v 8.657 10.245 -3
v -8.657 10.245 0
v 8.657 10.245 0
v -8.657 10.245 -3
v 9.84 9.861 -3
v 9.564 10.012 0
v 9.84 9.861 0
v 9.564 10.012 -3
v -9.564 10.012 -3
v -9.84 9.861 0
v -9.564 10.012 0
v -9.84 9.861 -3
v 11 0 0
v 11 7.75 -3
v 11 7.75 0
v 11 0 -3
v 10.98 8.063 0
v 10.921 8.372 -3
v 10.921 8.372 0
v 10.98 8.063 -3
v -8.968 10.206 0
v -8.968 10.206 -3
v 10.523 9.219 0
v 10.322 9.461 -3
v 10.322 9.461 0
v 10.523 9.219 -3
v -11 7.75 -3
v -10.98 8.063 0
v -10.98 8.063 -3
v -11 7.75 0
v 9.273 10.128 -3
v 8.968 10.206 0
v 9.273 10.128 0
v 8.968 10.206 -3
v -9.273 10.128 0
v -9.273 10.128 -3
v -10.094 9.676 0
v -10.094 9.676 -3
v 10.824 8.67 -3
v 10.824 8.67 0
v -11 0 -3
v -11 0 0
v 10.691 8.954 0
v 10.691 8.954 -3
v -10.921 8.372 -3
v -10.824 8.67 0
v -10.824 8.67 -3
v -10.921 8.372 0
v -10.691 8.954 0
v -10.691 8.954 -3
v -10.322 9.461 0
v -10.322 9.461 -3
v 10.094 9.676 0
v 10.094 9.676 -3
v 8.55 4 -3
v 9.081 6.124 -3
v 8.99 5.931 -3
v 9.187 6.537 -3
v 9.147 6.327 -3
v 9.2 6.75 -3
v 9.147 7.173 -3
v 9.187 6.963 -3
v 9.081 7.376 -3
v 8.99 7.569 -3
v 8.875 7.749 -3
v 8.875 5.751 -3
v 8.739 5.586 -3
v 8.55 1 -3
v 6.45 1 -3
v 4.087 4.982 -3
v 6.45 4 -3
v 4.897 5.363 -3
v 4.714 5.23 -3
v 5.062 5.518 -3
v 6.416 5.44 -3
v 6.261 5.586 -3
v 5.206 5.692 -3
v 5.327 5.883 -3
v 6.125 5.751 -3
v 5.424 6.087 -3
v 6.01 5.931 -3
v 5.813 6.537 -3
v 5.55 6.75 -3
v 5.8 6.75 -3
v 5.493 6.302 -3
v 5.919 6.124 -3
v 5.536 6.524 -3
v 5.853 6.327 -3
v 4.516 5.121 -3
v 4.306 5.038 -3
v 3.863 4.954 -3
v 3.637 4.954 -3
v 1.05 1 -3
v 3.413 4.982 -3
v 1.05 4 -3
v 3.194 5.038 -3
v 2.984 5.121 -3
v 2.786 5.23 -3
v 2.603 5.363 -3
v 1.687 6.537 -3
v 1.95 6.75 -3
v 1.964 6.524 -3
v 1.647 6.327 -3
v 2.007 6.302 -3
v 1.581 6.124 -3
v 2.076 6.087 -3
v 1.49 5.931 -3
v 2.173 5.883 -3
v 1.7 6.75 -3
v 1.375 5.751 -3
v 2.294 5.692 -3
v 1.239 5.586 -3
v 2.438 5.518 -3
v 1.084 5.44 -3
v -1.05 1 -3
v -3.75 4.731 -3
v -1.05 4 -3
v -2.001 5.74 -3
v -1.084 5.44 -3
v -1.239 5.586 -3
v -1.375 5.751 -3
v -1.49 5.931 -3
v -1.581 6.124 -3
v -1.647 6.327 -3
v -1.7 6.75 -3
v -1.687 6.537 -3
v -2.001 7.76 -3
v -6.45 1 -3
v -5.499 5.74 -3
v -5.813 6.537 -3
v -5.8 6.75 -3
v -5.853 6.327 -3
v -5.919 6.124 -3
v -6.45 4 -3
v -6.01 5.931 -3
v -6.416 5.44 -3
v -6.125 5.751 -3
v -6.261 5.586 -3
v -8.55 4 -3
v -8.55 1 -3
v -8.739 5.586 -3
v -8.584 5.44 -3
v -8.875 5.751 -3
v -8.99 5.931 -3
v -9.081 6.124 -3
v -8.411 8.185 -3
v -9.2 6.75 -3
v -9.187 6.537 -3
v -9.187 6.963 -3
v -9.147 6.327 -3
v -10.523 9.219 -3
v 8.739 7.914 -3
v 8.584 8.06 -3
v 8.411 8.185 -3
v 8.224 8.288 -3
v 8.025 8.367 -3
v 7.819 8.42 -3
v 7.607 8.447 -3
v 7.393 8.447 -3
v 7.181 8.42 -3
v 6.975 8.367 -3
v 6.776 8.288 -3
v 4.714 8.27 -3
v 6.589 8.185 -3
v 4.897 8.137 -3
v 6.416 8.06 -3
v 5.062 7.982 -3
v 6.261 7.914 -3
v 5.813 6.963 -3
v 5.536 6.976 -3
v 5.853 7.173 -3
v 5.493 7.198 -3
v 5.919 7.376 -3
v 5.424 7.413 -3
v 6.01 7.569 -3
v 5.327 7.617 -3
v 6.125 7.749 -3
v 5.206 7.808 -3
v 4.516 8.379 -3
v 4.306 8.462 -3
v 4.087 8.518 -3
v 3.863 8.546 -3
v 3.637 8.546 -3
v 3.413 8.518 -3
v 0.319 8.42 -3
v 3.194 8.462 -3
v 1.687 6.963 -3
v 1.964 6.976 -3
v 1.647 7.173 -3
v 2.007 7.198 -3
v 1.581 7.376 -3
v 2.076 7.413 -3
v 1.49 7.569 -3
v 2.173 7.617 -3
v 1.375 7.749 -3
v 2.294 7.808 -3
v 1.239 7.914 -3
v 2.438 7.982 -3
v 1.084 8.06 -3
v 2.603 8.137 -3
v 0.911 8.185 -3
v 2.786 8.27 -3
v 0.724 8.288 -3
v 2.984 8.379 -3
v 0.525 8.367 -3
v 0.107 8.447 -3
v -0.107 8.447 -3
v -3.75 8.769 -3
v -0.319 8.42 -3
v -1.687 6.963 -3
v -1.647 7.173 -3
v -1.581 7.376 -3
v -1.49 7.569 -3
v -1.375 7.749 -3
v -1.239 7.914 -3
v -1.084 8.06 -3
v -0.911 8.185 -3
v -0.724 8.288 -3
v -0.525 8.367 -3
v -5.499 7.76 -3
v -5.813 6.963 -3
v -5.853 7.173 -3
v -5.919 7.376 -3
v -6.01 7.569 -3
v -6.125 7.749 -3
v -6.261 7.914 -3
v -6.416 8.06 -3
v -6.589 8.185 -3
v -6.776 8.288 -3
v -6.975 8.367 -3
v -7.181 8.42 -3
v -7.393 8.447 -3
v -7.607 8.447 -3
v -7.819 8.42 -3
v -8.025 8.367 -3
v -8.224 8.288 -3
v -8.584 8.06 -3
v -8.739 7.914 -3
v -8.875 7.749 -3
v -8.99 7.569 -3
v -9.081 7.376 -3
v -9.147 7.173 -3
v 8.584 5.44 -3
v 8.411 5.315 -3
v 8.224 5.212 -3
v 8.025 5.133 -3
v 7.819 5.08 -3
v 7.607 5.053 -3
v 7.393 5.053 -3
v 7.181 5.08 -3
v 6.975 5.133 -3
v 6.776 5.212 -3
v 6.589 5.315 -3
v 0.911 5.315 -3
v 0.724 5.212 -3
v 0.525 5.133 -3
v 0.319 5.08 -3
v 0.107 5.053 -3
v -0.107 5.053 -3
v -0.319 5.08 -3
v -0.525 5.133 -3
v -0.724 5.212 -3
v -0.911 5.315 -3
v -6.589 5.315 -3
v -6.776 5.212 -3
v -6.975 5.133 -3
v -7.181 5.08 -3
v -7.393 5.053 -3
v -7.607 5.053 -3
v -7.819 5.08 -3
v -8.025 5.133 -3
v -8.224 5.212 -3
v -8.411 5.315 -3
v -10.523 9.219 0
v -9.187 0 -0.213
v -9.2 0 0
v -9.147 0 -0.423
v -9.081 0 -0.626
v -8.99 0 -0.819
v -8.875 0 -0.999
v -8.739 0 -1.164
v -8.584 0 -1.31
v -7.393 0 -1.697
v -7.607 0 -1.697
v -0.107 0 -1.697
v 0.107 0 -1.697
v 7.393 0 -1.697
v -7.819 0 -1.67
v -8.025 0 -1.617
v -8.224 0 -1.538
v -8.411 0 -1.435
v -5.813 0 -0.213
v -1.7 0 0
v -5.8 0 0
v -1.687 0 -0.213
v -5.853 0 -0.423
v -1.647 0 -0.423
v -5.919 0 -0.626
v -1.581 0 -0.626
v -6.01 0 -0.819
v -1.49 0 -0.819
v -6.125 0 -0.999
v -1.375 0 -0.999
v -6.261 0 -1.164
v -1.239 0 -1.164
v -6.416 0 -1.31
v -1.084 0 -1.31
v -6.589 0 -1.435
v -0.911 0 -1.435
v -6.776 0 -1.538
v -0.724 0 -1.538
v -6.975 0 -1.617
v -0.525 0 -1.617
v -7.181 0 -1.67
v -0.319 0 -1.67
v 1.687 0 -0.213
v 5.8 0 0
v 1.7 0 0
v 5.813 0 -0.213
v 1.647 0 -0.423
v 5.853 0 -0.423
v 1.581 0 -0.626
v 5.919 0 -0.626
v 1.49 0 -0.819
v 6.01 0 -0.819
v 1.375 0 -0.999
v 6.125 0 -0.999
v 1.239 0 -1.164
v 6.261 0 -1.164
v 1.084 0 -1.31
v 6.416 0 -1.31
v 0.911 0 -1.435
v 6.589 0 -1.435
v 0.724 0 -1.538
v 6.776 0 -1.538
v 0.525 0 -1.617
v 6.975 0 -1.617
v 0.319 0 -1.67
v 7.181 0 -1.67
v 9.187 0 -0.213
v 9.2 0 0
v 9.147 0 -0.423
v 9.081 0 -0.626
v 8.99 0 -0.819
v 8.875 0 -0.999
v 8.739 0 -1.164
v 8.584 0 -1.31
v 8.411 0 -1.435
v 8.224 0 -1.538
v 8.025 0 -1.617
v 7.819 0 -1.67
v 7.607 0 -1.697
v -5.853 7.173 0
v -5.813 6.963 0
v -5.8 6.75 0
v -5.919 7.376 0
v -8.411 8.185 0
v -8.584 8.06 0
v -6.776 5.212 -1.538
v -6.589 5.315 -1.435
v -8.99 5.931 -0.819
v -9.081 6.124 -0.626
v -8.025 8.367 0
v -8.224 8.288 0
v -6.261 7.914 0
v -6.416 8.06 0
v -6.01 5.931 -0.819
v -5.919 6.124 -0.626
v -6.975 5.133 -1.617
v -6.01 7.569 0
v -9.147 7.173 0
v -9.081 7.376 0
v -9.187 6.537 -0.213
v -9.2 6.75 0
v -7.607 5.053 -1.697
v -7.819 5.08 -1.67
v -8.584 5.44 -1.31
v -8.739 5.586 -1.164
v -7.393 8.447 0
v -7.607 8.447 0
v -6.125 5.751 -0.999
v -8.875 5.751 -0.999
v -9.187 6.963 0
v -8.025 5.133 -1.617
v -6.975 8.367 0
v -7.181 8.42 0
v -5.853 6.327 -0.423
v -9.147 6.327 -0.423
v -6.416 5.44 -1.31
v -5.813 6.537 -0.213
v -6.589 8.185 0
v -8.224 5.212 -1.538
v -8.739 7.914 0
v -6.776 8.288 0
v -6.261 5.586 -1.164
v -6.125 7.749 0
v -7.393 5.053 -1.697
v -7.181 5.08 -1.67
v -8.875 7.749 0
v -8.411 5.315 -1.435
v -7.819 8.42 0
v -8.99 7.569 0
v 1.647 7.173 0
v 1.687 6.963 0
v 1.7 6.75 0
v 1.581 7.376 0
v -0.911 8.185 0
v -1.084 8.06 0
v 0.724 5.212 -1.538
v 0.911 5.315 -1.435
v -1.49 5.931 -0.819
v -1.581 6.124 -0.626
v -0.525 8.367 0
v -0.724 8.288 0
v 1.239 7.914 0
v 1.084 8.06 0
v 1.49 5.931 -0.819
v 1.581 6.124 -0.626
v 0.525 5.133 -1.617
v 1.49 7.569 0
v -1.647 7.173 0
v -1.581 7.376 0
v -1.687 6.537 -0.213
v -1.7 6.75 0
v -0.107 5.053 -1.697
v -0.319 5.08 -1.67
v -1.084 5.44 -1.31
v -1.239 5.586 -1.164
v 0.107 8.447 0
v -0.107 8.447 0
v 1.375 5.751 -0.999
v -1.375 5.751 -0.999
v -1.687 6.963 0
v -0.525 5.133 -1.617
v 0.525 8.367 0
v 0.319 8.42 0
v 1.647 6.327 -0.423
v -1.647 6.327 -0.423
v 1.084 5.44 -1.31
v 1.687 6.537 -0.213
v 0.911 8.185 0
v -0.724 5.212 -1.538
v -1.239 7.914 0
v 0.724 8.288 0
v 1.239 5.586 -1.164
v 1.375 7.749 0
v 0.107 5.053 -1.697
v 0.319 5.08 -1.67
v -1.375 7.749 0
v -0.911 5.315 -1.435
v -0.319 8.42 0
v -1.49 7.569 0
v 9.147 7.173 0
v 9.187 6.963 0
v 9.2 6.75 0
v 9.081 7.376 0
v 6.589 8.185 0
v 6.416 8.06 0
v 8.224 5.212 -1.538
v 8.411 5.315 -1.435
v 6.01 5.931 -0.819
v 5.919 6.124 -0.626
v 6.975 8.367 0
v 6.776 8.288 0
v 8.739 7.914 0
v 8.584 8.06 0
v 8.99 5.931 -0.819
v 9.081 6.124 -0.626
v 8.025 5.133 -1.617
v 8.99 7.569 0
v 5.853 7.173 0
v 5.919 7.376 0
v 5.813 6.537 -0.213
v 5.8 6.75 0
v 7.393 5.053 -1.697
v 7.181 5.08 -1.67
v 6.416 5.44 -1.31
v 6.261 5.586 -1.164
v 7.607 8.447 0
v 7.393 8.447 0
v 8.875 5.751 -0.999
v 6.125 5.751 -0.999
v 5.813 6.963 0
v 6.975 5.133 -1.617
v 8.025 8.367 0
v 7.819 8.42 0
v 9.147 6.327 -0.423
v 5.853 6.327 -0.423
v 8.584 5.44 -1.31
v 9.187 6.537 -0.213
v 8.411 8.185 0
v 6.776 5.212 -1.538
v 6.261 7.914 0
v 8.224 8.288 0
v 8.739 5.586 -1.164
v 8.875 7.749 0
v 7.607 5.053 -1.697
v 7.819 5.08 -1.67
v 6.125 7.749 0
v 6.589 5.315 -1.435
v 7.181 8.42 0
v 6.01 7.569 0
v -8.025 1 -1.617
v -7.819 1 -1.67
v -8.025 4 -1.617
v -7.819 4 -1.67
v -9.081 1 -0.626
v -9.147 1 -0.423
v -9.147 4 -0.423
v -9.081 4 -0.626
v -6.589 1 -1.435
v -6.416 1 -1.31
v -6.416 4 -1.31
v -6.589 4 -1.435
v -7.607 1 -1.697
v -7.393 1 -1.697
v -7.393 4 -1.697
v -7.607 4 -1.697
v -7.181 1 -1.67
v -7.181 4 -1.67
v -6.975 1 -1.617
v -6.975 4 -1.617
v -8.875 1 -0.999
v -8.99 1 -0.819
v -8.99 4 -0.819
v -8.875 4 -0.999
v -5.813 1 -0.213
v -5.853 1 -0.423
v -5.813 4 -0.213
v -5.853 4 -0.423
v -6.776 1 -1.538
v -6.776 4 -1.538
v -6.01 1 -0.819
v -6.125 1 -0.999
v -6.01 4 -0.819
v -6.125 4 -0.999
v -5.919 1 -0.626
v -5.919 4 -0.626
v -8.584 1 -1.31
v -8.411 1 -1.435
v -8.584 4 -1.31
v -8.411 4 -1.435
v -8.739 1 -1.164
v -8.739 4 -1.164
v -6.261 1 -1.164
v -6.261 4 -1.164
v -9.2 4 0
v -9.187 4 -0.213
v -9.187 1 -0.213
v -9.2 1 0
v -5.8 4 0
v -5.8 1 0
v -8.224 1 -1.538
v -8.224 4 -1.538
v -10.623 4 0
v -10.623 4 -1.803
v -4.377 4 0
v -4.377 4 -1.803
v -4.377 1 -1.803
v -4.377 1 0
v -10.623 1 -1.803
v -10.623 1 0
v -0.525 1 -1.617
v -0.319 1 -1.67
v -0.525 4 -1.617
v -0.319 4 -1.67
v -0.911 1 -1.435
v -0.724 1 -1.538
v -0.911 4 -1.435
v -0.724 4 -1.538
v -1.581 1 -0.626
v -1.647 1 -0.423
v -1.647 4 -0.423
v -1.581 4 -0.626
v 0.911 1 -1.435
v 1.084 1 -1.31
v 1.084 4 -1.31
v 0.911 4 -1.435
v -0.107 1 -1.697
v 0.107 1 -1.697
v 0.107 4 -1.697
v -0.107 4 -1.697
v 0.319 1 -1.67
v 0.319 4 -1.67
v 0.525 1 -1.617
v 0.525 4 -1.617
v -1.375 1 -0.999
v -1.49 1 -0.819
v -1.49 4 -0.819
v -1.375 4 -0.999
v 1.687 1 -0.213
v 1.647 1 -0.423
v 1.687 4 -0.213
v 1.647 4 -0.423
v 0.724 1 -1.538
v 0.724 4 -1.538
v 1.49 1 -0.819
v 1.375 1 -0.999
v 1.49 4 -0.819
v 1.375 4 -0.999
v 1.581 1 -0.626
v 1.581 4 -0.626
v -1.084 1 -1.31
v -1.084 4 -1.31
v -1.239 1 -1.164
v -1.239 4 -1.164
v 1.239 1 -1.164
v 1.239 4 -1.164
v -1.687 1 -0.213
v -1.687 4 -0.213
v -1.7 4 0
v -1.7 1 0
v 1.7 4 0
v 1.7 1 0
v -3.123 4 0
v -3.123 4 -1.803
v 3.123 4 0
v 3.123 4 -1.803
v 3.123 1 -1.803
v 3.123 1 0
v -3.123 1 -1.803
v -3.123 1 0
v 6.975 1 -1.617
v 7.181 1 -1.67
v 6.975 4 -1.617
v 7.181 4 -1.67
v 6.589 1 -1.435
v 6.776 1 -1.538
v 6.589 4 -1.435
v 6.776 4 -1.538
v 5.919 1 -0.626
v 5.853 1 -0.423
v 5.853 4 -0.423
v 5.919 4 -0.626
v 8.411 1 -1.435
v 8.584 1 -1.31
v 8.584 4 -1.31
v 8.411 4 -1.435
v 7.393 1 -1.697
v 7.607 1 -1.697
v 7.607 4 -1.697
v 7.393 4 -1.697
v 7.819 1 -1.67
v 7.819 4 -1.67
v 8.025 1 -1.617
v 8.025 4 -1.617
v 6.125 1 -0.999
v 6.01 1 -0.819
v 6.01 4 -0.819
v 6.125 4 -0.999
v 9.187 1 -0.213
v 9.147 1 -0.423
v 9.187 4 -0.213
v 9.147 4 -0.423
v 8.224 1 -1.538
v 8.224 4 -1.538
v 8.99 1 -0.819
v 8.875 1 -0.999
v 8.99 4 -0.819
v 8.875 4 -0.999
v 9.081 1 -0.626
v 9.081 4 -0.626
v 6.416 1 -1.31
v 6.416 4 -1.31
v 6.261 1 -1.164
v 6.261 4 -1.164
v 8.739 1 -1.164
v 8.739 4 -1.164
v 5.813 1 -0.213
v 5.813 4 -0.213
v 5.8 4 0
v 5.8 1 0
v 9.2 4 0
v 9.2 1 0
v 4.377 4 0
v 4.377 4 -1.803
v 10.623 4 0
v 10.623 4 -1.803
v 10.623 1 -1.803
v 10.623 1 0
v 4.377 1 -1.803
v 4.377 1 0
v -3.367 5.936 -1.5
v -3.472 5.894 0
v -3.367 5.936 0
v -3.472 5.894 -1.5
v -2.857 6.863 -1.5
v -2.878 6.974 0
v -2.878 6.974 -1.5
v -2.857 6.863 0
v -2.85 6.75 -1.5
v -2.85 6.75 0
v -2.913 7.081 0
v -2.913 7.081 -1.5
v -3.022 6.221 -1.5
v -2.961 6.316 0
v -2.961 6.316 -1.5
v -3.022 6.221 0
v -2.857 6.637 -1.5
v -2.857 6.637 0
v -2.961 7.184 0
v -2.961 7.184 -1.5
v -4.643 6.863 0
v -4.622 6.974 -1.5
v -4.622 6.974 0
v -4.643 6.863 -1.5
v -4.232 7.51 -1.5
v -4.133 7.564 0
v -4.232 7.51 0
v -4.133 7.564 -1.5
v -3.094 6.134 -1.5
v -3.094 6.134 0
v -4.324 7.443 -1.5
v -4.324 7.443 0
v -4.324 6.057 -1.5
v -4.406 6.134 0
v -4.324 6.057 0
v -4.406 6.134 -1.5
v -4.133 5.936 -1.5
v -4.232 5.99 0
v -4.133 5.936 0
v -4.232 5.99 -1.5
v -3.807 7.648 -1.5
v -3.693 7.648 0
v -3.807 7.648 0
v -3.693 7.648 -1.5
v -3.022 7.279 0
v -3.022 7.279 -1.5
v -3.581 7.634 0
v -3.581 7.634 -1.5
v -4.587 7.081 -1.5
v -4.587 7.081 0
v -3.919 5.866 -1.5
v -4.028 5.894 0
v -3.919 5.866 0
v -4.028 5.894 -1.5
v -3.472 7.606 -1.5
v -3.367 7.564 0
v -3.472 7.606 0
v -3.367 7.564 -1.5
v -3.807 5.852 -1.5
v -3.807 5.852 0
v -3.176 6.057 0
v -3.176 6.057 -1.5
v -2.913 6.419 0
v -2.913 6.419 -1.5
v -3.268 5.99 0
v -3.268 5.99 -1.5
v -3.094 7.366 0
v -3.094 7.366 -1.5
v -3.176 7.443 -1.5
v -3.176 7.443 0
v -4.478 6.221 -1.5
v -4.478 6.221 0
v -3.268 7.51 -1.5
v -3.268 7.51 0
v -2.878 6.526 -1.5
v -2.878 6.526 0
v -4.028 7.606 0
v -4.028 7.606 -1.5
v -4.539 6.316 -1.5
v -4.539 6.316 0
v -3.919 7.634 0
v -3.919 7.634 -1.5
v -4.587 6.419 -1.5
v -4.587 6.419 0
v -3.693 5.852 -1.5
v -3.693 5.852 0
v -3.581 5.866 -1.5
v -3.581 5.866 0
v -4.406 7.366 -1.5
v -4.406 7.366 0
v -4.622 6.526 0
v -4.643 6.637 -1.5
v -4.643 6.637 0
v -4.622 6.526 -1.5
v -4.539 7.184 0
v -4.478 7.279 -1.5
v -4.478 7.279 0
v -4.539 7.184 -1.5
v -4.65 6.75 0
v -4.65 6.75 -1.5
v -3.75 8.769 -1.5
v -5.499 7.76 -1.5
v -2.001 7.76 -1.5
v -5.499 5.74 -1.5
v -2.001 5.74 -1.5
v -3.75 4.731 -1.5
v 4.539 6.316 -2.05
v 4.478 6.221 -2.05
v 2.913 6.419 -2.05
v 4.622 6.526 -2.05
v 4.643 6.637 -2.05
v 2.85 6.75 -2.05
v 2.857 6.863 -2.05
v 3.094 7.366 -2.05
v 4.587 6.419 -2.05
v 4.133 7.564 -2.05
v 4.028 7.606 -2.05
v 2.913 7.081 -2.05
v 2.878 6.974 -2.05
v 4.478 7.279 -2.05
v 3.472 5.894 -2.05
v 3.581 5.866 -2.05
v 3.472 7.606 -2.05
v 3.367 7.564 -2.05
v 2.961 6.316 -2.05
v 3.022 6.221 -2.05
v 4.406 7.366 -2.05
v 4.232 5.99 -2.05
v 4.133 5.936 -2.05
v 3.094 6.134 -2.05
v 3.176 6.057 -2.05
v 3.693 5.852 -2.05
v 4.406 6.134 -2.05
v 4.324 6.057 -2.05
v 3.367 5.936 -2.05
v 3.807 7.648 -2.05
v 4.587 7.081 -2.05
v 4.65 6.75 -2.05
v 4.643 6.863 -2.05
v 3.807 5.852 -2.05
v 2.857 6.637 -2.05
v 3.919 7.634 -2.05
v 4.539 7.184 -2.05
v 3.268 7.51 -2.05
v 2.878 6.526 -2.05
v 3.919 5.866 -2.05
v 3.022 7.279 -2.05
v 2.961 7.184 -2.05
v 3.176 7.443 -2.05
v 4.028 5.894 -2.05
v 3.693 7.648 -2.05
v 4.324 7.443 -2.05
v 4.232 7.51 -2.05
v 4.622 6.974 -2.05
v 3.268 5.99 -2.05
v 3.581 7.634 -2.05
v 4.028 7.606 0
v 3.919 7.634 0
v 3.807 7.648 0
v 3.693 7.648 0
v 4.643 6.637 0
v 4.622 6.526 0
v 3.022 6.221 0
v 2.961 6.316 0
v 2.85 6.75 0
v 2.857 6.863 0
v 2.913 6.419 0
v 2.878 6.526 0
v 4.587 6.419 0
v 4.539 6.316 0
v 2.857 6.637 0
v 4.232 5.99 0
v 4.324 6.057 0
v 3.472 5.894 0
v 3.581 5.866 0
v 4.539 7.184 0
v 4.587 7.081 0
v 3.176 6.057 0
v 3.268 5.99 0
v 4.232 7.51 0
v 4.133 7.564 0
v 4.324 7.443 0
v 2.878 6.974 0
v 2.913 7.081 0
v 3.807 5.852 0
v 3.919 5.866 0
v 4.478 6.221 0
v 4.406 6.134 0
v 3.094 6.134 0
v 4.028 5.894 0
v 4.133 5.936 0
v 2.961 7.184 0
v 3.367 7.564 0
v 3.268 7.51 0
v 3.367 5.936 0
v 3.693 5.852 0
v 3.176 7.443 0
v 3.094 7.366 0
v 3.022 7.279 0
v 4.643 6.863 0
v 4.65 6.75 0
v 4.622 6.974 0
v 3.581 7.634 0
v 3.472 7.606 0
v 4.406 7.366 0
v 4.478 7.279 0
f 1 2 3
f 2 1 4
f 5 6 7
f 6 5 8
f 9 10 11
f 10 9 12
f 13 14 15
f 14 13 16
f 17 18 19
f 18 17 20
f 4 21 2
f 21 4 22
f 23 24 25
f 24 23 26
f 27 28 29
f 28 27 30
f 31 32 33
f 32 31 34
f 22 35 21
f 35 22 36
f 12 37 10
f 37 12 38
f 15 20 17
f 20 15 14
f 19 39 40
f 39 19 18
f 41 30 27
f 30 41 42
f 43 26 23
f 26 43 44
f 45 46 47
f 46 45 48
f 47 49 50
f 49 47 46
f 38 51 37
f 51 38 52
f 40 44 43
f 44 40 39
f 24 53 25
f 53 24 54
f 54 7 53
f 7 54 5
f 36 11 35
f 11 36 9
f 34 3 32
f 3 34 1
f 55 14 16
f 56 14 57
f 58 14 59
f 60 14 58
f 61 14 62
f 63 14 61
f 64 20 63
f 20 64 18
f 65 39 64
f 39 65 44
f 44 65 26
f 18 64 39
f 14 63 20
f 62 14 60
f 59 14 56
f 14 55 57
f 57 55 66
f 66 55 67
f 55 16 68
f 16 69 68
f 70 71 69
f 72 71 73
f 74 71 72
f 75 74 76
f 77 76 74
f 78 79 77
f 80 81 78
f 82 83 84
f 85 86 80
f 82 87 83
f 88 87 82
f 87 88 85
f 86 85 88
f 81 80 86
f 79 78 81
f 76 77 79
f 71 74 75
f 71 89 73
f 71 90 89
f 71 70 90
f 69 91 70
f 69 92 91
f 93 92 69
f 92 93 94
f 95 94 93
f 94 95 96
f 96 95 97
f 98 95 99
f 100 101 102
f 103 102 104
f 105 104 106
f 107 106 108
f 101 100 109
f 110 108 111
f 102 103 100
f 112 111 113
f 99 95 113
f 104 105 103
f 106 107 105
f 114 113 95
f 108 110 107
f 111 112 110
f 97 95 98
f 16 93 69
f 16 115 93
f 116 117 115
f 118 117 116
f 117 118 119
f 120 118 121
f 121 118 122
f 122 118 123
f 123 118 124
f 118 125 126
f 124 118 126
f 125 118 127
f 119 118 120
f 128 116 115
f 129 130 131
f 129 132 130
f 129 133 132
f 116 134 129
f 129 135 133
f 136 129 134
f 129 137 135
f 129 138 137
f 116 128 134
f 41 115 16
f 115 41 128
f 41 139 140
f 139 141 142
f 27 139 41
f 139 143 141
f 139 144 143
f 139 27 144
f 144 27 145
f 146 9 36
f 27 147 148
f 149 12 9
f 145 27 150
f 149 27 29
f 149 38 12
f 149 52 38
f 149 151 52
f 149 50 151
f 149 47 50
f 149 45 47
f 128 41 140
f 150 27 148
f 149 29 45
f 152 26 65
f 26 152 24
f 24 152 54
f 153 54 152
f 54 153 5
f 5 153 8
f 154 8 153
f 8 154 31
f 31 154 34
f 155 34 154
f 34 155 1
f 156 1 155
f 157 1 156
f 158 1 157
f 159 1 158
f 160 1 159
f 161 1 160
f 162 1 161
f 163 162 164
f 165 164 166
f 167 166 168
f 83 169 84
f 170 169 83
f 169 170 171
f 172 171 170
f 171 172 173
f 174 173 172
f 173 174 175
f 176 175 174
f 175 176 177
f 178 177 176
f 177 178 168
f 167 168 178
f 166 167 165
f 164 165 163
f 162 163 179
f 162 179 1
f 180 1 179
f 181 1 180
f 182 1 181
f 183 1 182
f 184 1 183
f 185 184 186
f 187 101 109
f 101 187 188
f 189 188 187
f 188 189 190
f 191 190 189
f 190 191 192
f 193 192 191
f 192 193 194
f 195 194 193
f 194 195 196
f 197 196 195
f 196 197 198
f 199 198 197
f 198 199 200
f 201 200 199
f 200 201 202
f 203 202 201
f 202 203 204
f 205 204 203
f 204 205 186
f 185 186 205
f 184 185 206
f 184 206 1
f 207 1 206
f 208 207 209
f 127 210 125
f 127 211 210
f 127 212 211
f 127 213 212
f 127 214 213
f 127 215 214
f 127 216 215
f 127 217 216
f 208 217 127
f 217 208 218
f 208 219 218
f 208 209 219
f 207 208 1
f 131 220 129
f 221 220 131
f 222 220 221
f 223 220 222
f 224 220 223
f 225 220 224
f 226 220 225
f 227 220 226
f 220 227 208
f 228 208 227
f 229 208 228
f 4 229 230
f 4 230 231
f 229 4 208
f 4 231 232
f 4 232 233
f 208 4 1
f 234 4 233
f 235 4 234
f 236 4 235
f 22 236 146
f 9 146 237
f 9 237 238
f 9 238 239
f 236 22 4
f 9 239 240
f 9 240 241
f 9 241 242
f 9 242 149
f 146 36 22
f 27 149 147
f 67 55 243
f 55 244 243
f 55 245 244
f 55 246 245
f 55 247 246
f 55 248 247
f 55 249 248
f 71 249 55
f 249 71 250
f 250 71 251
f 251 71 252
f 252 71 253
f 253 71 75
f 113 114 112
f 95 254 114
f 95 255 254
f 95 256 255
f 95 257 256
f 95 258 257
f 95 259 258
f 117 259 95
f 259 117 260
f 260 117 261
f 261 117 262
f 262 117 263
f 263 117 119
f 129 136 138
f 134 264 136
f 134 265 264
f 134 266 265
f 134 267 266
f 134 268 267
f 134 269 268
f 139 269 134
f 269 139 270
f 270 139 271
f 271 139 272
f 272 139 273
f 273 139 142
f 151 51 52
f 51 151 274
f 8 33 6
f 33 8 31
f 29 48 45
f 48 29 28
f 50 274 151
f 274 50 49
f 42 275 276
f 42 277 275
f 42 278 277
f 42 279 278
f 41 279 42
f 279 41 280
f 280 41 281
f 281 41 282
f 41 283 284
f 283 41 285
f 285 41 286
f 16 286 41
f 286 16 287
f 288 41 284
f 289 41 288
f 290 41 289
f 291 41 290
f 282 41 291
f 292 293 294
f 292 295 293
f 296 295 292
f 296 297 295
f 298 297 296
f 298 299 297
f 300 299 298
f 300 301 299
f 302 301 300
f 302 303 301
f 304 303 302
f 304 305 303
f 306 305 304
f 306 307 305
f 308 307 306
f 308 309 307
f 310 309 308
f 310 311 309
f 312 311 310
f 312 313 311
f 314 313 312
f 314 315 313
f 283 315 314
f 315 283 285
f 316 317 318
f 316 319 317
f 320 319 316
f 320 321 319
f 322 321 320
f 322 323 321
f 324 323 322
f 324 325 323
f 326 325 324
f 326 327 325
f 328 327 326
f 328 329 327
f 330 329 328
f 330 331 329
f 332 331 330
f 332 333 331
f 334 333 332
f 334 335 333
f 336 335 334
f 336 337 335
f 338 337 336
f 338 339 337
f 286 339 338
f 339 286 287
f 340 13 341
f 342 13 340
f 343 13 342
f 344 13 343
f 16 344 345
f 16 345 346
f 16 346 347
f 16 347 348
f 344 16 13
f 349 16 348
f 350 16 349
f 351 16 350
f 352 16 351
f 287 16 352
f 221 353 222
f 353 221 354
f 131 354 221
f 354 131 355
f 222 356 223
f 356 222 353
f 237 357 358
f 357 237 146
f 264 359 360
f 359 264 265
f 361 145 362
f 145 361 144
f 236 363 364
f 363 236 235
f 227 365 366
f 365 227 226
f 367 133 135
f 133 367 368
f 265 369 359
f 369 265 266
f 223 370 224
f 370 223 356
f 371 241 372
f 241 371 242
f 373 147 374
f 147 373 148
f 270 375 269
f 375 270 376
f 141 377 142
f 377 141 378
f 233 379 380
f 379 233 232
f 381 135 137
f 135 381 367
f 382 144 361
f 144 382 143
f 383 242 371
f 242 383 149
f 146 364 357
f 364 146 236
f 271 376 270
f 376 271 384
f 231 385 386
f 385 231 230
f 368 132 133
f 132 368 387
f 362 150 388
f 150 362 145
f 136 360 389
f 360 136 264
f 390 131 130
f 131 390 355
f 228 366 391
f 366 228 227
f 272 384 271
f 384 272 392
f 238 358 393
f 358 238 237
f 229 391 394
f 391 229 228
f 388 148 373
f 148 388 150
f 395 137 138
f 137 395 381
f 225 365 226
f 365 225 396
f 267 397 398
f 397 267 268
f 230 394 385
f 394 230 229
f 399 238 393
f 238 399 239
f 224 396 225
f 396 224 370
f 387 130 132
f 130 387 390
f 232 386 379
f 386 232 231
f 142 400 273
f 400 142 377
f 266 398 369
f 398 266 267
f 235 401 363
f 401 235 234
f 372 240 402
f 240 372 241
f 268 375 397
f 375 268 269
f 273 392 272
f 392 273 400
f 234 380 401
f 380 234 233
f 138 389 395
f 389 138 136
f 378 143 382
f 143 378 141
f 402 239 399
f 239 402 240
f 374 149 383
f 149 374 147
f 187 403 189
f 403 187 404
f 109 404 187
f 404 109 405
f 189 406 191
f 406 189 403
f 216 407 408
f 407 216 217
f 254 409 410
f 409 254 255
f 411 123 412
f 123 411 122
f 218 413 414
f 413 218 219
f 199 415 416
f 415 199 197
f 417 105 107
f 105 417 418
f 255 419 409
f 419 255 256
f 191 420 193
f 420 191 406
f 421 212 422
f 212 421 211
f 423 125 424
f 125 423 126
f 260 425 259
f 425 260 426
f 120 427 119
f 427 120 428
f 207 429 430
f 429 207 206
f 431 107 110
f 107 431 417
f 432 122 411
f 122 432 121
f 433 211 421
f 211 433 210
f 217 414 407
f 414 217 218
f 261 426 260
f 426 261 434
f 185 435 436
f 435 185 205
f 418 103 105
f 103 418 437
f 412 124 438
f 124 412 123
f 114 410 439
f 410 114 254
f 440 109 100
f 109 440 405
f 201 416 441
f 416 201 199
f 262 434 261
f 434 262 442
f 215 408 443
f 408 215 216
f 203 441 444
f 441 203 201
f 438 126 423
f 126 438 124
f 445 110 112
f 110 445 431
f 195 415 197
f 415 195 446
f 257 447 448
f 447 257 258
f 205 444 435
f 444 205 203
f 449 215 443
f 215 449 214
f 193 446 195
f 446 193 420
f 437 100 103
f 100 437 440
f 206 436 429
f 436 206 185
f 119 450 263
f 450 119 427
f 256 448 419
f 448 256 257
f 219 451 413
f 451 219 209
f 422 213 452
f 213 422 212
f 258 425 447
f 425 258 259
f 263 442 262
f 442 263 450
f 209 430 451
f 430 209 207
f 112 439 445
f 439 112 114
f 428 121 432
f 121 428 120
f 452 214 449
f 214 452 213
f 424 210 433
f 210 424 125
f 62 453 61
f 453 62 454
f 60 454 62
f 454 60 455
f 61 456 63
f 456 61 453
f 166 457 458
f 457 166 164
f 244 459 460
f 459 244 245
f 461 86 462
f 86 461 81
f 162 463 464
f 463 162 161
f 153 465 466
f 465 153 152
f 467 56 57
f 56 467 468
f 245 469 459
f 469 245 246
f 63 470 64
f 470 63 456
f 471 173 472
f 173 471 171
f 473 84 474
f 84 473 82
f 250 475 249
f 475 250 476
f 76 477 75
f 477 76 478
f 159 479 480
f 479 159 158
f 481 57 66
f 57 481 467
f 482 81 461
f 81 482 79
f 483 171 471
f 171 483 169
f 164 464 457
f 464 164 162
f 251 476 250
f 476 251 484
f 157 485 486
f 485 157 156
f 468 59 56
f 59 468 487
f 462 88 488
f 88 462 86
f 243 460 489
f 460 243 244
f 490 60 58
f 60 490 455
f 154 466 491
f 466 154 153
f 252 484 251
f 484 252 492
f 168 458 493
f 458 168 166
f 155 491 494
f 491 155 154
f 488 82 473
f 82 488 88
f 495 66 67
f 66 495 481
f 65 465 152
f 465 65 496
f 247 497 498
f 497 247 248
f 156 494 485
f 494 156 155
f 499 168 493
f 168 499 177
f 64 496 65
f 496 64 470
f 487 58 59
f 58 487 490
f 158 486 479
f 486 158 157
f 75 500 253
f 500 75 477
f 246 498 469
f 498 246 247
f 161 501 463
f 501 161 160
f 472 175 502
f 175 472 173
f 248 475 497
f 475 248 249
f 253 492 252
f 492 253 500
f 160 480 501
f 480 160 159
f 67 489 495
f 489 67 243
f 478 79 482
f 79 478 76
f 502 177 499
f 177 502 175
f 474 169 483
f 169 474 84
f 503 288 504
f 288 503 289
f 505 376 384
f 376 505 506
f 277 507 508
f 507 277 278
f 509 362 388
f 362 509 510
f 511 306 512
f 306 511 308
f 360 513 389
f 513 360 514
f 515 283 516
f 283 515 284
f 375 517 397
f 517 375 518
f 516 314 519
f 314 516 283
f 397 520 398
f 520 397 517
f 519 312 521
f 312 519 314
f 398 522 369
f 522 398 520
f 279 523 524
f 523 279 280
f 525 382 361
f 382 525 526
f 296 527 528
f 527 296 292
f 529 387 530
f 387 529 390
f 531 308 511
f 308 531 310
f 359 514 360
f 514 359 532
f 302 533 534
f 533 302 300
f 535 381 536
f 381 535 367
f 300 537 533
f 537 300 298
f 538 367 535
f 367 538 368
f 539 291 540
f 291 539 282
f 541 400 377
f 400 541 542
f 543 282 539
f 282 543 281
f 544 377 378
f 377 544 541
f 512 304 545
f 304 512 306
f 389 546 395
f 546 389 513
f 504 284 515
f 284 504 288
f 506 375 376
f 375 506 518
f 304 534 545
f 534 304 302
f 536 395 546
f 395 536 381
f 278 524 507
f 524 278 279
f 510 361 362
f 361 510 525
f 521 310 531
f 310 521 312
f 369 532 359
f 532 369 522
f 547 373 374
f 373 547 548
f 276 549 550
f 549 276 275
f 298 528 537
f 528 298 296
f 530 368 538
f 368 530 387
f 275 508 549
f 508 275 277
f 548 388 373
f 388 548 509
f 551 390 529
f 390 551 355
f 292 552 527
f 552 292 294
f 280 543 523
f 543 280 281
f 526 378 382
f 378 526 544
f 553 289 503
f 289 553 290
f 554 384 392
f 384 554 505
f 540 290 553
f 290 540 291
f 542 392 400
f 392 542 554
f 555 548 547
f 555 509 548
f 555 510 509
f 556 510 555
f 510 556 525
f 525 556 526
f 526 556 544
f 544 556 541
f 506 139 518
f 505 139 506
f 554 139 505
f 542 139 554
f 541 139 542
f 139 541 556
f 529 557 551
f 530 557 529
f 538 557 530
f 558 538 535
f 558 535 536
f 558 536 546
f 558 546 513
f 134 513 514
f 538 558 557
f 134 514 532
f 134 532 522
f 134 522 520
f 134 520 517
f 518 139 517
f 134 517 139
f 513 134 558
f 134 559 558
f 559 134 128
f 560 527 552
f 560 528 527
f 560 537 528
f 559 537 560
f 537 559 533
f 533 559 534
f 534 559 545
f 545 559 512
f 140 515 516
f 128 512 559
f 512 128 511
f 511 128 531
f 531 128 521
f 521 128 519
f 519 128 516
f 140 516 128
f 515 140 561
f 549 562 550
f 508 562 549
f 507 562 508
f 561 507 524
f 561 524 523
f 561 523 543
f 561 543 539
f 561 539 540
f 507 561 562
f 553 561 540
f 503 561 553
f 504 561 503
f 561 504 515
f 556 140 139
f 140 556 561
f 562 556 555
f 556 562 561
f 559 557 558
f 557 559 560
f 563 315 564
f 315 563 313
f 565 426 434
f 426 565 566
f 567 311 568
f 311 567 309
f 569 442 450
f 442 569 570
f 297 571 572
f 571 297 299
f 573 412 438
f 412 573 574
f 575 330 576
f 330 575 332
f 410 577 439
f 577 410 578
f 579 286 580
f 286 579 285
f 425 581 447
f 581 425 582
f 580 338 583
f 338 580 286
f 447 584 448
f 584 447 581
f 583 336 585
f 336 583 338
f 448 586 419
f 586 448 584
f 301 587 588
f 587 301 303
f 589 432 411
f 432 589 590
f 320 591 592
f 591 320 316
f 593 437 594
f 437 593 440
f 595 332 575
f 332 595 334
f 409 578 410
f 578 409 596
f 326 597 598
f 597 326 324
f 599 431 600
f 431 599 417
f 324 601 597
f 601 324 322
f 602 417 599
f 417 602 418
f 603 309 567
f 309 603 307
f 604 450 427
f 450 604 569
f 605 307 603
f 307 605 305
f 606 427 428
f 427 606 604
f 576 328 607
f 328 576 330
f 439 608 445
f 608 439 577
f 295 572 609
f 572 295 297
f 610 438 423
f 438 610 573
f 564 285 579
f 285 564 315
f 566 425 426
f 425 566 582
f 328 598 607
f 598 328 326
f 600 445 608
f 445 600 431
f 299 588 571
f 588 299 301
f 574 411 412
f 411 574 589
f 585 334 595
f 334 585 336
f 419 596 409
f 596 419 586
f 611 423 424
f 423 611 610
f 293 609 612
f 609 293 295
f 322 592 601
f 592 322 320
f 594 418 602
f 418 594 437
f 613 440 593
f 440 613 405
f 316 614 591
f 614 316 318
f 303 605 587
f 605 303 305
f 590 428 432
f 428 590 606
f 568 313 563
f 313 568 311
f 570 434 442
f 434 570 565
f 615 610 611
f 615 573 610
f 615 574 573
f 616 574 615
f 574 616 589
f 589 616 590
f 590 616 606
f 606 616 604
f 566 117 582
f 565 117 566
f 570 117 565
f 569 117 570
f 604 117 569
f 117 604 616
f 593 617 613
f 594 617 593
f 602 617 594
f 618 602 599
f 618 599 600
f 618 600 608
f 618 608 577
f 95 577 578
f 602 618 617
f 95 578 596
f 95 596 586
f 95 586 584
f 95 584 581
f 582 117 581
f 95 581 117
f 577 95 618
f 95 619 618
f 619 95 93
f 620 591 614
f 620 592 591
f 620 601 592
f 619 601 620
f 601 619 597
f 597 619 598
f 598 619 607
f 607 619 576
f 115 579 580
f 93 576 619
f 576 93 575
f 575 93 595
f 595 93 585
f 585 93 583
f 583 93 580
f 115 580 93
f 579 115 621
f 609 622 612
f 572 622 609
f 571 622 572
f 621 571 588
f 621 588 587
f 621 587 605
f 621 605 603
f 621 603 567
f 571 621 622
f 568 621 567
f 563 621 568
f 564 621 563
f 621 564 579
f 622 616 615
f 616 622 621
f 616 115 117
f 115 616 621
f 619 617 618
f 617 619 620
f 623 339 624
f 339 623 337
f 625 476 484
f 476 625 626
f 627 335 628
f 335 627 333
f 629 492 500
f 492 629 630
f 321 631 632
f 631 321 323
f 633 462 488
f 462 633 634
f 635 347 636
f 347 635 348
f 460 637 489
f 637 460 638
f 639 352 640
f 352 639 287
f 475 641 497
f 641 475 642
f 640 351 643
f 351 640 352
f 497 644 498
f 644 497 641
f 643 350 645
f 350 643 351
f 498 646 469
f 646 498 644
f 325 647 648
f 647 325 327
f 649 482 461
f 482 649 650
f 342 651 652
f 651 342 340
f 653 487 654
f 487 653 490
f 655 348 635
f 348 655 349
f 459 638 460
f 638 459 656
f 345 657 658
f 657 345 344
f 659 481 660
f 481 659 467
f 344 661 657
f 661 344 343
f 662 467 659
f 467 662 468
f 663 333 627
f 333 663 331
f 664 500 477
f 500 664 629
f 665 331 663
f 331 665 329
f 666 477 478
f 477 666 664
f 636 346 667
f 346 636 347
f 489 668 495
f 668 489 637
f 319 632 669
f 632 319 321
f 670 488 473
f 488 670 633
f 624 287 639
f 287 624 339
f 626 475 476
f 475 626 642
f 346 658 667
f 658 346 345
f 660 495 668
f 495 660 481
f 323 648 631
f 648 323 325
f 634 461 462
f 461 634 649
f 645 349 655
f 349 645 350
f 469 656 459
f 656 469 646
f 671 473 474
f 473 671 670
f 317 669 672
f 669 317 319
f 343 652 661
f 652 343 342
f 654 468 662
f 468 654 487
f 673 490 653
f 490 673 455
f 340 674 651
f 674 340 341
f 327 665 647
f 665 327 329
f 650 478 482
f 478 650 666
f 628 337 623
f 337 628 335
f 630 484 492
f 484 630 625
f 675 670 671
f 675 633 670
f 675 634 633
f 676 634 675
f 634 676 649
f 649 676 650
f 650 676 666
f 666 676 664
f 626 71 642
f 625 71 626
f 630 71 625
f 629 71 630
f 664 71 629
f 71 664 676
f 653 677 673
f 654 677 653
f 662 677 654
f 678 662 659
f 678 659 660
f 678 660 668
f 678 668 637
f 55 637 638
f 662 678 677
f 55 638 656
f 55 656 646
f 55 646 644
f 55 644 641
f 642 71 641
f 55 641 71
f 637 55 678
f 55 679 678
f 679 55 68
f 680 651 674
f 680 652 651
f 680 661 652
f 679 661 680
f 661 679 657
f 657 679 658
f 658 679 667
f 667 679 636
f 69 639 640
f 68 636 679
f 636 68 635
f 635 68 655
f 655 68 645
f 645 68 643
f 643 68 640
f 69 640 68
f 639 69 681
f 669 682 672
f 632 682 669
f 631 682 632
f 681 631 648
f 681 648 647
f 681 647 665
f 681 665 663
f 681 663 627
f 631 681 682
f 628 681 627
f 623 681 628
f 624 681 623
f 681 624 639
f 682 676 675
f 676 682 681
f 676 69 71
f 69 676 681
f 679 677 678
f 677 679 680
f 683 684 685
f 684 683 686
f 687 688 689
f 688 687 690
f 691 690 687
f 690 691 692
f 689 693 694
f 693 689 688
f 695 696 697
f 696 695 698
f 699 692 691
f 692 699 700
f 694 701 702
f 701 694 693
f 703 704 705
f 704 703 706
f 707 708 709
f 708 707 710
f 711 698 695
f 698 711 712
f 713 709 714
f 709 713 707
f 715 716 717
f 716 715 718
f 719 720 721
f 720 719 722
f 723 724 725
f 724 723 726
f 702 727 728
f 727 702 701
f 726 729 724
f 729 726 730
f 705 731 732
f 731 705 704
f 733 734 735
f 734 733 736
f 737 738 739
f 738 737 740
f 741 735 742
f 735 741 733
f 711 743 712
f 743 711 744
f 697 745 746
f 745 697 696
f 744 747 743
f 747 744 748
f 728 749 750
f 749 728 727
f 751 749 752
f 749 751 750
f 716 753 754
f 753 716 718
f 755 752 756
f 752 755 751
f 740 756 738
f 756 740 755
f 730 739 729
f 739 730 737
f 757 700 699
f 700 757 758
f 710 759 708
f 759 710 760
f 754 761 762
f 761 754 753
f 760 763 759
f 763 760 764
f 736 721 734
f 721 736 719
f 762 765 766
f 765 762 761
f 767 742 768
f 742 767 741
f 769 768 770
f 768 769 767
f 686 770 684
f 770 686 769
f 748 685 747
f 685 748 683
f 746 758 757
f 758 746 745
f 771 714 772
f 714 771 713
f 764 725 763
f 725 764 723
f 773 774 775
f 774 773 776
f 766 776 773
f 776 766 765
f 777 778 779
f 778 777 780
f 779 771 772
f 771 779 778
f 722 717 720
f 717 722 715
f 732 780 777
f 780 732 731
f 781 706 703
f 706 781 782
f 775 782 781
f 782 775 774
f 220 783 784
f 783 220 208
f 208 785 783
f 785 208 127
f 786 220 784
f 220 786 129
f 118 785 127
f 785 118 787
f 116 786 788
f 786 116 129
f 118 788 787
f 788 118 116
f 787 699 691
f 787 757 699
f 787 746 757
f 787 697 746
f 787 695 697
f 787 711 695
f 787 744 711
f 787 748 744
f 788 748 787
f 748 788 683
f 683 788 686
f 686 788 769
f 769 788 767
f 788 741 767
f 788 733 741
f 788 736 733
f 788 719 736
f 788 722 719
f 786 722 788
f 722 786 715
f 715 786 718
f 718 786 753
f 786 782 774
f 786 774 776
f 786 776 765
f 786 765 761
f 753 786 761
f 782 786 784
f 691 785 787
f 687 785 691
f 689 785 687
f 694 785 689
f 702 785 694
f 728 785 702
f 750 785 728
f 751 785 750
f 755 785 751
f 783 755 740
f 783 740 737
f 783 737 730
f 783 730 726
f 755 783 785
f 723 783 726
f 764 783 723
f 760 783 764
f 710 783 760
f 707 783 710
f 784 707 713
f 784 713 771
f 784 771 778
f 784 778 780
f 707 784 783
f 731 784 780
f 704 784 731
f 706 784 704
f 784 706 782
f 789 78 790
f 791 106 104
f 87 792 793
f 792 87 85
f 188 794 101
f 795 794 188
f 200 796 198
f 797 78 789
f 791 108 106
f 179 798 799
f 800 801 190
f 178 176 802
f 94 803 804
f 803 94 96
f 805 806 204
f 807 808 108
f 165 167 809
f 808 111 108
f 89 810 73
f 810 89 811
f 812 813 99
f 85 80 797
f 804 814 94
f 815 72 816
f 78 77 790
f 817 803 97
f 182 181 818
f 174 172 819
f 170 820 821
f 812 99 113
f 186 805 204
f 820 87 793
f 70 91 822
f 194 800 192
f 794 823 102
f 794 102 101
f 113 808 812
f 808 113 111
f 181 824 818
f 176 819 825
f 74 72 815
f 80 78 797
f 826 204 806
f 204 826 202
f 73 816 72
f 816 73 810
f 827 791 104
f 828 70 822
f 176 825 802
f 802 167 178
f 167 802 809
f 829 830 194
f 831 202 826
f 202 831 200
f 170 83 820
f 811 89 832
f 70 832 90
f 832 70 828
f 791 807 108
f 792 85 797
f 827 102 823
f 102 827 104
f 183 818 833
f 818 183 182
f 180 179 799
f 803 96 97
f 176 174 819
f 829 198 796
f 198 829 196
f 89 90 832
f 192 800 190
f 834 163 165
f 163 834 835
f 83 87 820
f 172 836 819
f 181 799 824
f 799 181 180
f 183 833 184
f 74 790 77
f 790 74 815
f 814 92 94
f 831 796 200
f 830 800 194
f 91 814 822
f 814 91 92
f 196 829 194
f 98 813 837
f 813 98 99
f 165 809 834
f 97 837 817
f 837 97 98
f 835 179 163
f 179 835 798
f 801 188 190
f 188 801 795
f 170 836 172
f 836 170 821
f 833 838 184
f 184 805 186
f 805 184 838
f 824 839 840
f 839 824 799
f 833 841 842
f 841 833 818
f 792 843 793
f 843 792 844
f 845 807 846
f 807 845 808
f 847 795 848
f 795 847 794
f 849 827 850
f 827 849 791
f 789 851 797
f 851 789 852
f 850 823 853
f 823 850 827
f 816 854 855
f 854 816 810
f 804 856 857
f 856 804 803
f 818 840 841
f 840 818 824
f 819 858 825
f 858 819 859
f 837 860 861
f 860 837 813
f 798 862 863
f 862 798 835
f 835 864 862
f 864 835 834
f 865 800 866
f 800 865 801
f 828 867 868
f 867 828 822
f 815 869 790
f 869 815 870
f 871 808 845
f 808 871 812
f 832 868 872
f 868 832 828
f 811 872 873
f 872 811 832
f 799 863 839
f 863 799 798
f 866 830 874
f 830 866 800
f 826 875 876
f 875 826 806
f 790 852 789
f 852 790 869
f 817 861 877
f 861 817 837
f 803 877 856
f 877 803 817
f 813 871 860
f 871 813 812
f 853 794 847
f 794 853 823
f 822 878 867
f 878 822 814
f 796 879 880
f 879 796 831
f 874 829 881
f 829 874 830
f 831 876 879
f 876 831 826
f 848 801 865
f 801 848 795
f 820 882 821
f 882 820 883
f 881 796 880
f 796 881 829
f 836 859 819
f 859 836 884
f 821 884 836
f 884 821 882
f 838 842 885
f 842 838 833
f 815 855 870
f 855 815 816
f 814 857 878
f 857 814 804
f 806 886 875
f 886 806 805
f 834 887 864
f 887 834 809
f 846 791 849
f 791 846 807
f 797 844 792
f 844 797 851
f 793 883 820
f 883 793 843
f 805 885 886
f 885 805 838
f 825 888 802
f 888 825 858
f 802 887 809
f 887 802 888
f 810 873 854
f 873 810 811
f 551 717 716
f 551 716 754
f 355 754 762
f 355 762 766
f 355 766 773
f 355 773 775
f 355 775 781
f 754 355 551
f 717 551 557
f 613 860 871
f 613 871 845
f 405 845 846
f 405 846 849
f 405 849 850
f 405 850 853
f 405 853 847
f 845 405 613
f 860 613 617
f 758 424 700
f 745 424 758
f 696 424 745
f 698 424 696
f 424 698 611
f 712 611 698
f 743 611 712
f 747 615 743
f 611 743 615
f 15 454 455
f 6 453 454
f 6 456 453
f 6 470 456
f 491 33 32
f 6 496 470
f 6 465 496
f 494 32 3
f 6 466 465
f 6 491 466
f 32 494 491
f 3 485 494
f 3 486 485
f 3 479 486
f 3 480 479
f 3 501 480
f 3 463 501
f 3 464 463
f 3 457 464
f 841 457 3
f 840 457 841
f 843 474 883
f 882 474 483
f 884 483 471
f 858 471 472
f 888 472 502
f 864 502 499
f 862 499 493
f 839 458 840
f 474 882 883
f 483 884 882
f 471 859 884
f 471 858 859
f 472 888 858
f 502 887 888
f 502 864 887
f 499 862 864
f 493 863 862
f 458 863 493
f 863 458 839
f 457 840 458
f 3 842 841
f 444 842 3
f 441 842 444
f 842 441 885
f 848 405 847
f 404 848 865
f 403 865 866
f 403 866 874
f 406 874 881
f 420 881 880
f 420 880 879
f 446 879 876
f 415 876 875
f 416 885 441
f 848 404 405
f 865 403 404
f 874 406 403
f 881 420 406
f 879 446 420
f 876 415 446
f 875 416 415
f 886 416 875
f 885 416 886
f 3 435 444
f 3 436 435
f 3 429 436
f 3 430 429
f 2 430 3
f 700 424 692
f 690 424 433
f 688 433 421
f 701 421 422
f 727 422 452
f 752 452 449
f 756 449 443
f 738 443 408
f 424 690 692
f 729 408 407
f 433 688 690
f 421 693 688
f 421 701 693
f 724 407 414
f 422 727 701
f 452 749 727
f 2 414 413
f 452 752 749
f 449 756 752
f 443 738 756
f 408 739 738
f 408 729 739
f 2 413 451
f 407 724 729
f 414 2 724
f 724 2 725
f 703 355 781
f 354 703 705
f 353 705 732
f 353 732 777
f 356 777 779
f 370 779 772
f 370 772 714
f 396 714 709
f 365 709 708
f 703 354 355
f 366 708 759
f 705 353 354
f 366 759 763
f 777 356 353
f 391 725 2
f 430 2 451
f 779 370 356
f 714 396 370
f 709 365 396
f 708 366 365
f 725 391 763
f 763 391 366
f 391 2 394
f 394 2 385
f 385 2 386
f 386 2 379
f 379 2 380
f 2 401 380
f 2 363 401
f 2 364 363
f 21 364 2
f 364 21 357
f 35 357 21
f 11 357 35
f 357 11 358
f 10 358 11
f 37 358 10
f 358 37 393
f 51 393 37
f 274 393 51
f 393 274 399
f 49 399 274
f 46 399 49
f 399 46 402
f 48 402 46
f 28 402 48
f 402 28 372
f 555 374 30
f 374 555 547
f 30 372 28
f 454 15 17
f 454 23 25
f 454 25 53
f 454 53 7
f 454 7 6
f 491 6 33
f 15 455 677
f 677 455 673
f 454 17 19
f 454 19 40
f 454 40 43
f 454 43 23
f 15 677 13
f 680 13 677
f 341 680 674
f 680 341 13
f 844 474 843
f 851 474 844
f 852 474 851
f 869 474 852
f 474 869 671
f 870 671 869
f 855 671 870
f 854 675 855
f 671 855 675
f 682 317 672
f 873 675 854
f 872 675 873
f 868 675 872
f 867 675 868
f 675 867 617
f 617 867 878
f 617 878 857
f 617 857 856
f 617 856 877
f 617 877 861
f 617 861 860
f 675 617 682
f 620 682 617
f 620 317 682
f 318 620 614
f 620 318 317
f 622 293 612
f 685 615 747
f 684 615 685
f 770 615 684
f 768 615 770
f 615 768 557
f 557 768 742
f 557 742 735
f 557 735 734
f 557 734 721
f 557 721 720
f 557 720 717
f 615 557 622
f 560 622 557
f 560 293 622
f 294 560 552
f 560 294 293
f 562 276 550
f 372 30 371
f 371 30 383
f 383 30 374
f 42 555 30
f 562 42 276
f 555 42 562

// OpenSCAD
$fn = 50;


difference() {
	union() {
		translate(v = [0, 6.7500000000, -3.0000000000]) {
			rotate(a = [0, 0, 0]) {
				hull() {
					translate(v = [-8.5000000000, 1.0000000000, 0]) {
						rotate(a = [0, 0, 0]) {
							translate(v = [0, 0, 0]) {
								rotate(a = [0, 0, 0]) {
									cylinder(h = 6, r = 2.5000000000);
								}
							}
						}
					}
					translate(v = [8.5000000000, 1.0000000000, 0]) {
						rotate(a = [0, 0, 0]) {
							translate(v = [0, 0, 0]) {
								rotate(a = [0, 0, 0]) {
									cylinder(h = 6, r = 2.5000000000);
								}
							}
						}
					}
					translate(v = [-8.5000000000, -1.0000000000, 0]) {
						rotate(a = [0, 0, 0]) {
							translate(v = [0, 0, 0]) {
								rotate(a = [0, 0, 0]) {
									cylinder(h = 6, r = 2.5000000000);
								}
							}
						}
					}
					translate(v = [8.5000000000, -1.0000000000, 0]) {
						rotate(a = [0, 0, 0]) {
							translate(v = [0, 0, 0]) {
								rotate(a = [0, 0, 0]) {
									cylinder(h = 6, r = 2.5000000000);
								}
							}
						}
					}
				}
			}
		}
		translate(v = [-11.0000000000, 0, -3.0000000000]) {
			rotate(a = [0, 0, 0]) {
				cube(size = [22.0000000000, 6.7500000000, 6]);
			}
		}
	}
	union() {
		translate(v = [-7.5000000000, 6.7500000000, -3.0000000000]) {
			rotate(a = [0, 0, 0]) {
				translate(v = [0, 0, -50]) {
					rotate(a = [0, 0, 0]) {
						cylinder(h = 100, r = 1.7000000000);
					}
				}
			}
		}
		translate(v = [0.0000000000, 6.7500000000, -3.0000000000]) {
			rotate(a = [0, 0, 0]) {
				translate(v = [0, 0, -50]) {
					rotate(a = [0, 0, 0]) {
						cylinder(h = 100, r = 1.7000000000);
					}
				}
			}
		}
		translate(v = [7.5000000000, 6.7500000000, -3.0000000000]) {
			rotate(a = [0, 0, 0]) {
				translate(v = [0, 0, -50]) {
					rotate(a = [0, 0, 0]) {
						cylinder(h = 100, r = 1.7000000000);
					}
				}
			}
		}
		translate(v = [-7.5000000000, 6.7500000000, 0]) {
			rotate(a = [90, 0, 0]) {
				cylinder(h = 6.7500000000, r = 1.7000000000);
			}
		}
		translate(v = [-7.5000000000, 4, 0]) {
			rotate(a = [90, 30.0000000000, 0]) {
				#translate(v = [0, 0, 0]) {
					rotate(a = [0, 0, 0]) {
						linear_extrude(height = 3) {
							polygon(points = [[3.6062500000, 0.0000000000], [1.8031250000, 3.1231041124], [-1.8031250000, 3.1231041124], [-3.6062500000, 0.0000000000], [-1.8031250000, -3.1231041124], [1.8031250000, -3.1231041124]]);
						}
					}
				}
			}
		}
		translate(v = [0.0000000000, 6.7500000000, 0]) {
			rotate(a = [90, 0, 0]) {
				cylinder(h = 6.7500000000, r = 1.7000000000);
			}
		}
		translate(v = [0.0000000000, 4, 0]) {
			rotate(a = [90, 30.0000000000, 0]) {
				#translate(v = [0, 0, 0]) {
					rotate(a = [0, 0, 0]) {
						linear_extrude(height = 3) {
							polygon(points = [[3.6062500000, 0.0000000000], [1.8031250000, 3.1231041124], [-1.8031250000, 3.1231041124], [-3.6062500000, 0.0000000000], [-1.8031250000, -3.1231041124], [1.8031250000, -3.1231041124]]);
						}
					}
				}
			}
		}
		translate(v = [7.5000000000, 6.7500000000, 0]) {
			rotate(a = [90, 0, 0]) {
				cylinder(h = 6.7500000000, r = 1.7000000000);
			}
		}
		translate(v = [7.5000000000, 4, 0]) {
			rotate(a = [90, 30.0000000000, 0]) {
				#translate(v = [0, 0, 0]) {
					rotate(a = [0, 0, 0]) {
						linear_extrude(height = 3) {
							polygon(points = [[3.6062500000, 0.0000000000], [1.8031250000, 3.1231041124], [-1.8031250000, 3.1231041124], [-3.6062500000, 0.0000000000], [-1.8031250000, -3.1231041124], [1.8031250000, -3.1231041124]]);
						}
					}
				}
			}
		}
		translate(v = [-3.7500000000, 6.7500000000, 2.0500000000]) {
			rotate(a = [0, 0, 0]) {
				cylinder(h = 0.9500000000, r1 = 0.9000000000, r2 = 1.8000000000);
			}
		}
		translate(v = [-3.7500000000, 6.7500000000, -3.0000000000]) {
			rotate(a = [0, 0, 0]) {
				cylinder(h = 6.0000000000, r = 0.9000000000);
			}
		}
		translate(v = [-3.7500000000, 6.7500000000, -3.0000000000]) {
			rotate(a = [0, 0, 30.0000000000]) {
				translate(v = [0, 0, 0]) {
					rotate(a = [0, 0, 0]) {
						linear_extrude(height = 1.5000000000) {
							polygon(points = [[2.0195000000, 0.0000000000], [1.0097500000, 1.7489383029], [-1.0097500000, 1.7489383029], [-2.0195000000, 0.0000000000], [-1.0097500000, -1.7489383029], [1.0097500000, -1.7489383029]]);
						}
					}
				}
			}
		}
		translate(v = [3.7500000000, 6.7500000000, -2.0500000000]) {
			rotate(a = [0, 180, 0]) {
				cylinder(h = 0.9500000000, r1 = 0.9000000000, r2 = 1.8000000000);
			}
		}
		translate(v = [3.7500000000, 6.7500000000, 3.0000000000]) {
			rotate(a = [0, 180, 0]) {
				cylinder(h = 6.0000000000, r = 0.9000000000);
			}
		}
		translate(v = [3.7500000000, 6.7500000000, 3.0000000000]) {
			rotate(a = [0, 180, 30.0000000000]) {
				translate(v = [0, 0, 0]) {
					rotate(a = [0, 0, 0]) {
						linear_extrude(height = 1.5000000000) {
							polygon(points = [[2.0195000000, 0.0000000000], [1.0097500000, 1.7489383029], [-1.0097500000, 1.7489383029], [-2.0195000000, 0.0000000000], [-1.0097500000, -1.7489383029], [1.0097500000, -1.7489383029]]);
						}
					}
				}
			}
		}
		translate(v = [-250.0000000000, -250.0000000000, 0]) {
			rotate(a = [0, 0, 0]) {
				cube(size = [500, 500, 500]);
			}
		}
	}
}
